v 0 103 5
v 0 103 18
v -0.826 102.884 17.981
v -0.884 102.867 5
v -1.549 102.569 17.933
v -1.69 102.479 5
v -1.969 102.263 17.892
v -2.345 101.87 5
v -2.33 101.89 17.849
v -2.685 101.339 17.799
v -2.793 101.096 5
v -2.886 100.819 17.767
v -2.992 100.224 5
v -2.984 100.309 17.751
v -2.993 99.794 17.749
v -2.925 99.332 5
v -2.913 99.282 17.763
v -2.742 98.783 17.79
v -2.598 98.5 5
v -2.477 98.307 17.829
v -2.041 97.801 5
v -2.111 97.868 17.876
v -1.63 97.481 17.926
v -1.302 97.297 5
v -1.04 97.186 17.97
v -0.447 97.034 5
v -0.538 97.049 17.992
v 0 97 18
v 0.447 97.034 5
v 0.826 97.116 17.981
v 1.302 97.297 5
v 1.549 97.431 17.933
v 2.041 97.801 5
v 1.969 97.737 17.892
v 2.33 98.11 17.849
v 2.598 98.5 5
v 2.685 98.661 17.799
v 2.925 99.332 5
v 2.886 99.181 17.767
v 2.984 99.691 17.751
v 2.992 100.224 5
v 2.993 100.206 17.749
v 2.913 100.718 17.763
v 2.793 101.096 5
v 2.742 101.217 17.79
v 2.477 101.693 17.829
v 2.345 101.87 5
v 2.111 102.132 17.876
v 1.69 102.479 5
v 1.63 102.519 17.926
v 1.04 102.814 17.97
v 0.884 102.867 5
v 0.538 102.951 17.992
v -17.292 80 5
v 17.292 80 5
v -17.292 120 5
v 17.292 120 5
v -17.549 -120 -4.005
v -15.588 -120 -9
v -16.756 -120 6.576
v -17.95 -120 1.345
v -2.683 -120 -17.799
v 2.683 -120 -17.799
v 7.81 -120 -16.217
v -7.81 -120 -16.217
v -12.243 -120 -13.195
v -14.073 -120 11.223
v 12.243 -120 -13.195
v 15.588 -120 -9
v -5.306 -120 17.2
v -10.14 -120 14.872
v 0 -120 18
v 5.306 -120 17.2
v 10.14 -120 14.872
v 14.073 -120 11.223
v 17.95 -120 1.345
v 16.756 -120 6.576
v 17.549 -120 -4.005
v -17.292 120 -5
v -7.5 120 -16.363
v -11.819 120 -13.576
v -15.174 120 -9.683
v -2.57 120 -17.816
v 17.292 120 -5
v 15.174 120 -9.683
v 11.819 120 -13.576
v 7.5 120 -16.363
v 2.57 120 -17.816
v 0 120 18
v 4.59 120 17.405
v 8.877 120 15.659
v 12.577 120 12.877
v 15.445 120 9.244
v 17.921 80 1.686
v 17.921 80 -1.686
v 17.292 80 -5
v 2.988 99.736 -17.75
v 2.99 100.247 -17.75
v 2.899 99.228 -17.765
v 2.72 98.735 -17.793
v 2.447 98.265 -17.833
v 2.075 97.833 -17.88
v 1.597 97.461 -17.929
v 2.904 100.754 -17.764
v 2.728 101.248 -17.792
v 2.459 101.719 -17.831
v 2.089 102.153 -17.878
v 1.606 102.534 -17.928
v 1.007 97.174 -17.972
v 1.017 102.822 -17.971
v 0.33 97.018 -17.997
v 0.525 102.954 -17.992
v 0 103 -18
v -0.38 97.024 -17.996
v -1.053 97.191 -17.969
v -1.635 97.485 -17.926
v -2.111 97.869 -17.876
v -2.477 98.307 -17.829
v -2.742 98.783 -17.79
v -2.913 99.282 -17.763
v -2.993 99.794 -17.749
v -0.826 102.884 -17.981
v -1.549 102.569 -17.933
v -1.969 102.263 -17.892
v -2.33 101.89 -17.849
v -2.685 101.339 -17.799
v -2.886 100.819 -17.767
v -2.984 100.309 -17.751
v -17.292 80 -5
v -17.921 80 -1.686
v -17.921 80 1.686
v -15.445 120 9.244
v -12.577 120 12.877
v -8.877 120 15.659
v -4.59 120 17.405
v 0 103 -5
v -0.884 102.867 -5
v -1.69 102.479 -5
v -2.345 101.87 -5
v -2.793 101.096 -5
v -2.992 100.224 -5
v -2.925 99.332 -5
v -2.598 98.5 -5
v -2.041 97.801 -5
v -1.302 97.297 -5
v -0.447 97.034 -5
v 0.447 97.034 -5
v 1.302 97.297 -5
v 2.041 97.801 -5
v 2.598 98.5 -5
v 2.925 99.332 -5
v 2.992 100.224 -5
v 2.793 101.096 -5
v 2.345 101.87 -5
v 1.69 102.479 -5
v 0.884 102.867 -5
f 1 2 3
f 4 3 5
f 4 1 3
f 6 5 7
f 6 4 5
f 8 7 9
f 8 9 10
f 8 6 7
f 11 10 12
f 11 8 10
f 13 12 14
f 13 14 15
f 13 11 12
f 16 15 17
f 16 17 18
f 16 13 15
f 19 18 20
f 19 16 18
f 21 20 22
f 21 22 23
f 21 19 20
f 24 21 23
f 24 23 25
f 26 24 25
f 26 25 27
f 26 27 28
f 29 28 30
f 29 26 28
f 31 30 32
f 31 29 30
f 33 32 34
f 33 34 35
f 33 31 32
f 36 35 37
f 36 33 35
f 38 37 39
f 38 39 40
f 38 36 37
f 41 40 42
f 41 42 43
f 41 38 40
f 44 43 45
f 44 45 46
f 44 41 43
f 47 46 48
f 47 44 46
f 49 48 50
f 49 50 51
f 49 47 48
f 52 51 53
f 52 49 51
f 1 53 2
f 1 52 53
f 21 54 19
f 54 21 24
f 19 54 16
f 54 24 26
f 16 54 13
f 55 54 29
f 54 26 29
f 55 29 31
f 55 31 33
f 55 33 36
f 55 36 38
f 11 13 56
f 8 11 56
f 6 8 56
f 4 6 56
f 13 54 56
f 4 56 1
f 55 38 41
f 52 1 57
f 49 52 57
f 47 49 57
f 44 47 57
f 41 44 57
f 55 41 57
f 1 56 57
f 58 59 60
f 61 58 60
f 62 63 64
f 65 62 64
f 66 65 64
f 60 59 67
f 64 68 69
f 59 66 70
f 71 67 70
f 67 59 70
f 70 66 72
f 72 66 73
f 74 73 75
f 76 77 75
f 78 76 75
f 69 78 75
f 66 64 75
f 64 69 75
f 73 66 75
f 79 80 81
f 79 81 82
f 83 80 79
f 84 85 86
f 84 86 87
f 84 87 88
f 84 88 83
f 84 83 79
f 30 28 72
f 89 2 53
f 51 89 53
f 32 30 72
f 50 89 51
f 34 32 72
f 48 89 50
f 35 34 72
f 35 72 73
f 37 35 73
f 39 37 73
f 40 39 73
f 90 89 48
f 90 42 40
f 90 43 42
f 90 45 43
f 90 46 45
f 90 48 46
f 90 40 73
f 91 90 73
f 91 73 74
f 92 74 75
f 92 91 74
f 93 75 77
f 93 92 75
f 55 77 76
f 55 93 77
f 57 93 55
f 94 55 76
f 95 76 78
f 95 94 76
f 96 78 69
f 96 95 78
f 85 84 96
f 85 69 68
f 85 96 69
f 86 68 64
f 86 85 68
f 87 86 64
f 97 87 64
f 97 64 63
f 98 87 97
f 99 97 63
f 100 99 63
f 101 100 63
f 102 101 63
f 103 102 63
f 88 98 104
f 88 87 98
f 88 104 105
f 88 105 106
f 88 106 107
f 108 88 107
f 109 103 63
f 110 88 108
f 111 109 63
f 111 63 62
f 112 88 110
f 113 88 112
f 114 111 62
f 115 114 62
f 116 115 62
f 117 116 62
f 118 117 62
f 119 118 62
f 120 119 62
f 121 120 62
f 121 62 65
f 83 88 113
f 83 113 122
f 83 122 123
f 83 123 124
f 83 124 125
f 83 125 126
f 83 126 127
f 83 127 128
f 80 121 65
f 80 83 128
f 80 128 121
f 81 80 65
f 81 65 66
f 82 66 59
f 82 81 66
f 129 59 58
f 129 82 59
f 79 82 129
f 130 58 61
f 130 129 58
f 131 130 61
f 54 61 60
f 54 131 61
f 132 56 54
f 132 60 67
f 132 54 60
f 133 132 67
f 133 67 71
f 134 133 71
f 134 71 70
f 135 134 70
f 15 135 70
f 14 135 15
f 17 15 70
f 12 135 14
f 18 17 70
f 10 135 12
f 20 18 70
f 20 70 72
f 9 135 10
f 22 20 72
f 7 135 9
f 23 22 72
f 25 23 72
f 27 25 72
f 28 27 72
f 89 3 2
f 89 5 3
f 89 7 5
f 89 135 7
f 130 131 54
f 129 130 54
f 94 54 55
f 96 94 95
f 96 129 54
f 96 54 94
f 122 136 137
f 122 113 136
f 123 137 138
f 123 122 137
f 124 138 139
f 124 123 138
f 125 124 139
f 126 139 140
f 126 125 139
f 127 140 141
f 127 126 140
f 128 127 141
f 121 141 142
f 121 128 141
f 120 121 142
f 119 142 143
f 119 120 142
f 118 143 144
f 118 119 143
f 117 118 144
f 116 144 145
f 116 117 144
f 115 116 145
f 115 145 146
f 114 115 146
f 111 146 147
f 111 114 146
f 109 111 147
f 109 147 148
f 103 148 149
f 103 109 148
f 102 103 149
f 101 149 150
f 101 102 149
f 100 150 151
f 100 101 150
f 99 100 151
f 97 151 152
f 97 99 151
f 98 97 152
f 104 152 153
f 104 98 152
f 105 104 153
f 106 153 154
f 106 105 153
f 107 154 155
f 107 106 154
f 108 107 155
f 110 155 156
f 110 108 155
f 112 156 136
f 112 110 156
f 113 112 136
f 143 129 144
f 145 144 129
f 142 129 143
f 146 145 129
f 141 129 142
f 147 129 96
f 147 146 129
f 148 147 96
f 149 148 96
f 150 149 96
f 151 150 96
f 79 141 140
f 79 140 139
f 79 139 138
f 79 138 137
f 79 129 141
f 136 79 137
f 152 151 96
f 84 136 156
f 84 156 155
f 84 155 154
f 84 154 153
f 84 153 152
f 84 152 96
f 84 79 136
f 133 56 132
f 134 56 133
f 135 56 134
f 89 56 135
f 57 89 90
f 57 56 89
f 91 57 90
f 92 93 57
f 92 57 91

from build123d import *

# Parameters (mm, degrees)
SKETCH1_R               = 18
BOSS_EXTRUDE1_DEPTH     = 120
SKETCH2_W               = 50
SKETCH2_H               = 10
CUT_EXTRUDE1_DEPTH      = 40
CUT_EXTRUDE2_DEPTH      = 123.670289802
CUT_EXTRUDE2_DEPTH_BACK = 123.670289802
SKETCH3_R               = 3


with BuildPart() as part:
    # Sketch1 → Boss-Extrude1 (new, symmetric)
    with BuildSketch(Plane(origin=(0, 0, 0), x_dir=(1, 0, 0), z_dir=(0, 1, 0))):
        with Locations(Location((0, 0, 0), (0, 0, 270))):
            Circle(SKETCH1_R)
    extrude(amount=BOSS_EXTRUDE1_DEPTH, both=True)

    # Sketch2 → Cut-Extrude1 (cut)
    with BuildSketch(Plane(origin=(0, 120, 0), x_dir=(1, 0, 0), z_dir=(0, 1, 0))):
        Rectangle(SKETCH2_W, SKETCH2_H)
    extrude(amount=-CUT_EXTRUDE1_DEPTH, mode=Mode.SUBTRACT)

    # Sketch3 → Cut-Extrude2 (cut, two sides: drawn at the far end of the back side and taken through both)
    with BuildSketch(Plane.XY.offset(-CUT_EXTRUDE2_DEPTH_BACK)):
        with Locations(Location((0, 100, 0), (0, 0, 90))):
            Circle(SKETCH3_R)
    extrude(amount=CUT_EXTRUDE2_DEPTH + CUT_EXTRUDE2_DEPTH_BACK, mode=Mode.SUBTRACT)


solid = part.part
